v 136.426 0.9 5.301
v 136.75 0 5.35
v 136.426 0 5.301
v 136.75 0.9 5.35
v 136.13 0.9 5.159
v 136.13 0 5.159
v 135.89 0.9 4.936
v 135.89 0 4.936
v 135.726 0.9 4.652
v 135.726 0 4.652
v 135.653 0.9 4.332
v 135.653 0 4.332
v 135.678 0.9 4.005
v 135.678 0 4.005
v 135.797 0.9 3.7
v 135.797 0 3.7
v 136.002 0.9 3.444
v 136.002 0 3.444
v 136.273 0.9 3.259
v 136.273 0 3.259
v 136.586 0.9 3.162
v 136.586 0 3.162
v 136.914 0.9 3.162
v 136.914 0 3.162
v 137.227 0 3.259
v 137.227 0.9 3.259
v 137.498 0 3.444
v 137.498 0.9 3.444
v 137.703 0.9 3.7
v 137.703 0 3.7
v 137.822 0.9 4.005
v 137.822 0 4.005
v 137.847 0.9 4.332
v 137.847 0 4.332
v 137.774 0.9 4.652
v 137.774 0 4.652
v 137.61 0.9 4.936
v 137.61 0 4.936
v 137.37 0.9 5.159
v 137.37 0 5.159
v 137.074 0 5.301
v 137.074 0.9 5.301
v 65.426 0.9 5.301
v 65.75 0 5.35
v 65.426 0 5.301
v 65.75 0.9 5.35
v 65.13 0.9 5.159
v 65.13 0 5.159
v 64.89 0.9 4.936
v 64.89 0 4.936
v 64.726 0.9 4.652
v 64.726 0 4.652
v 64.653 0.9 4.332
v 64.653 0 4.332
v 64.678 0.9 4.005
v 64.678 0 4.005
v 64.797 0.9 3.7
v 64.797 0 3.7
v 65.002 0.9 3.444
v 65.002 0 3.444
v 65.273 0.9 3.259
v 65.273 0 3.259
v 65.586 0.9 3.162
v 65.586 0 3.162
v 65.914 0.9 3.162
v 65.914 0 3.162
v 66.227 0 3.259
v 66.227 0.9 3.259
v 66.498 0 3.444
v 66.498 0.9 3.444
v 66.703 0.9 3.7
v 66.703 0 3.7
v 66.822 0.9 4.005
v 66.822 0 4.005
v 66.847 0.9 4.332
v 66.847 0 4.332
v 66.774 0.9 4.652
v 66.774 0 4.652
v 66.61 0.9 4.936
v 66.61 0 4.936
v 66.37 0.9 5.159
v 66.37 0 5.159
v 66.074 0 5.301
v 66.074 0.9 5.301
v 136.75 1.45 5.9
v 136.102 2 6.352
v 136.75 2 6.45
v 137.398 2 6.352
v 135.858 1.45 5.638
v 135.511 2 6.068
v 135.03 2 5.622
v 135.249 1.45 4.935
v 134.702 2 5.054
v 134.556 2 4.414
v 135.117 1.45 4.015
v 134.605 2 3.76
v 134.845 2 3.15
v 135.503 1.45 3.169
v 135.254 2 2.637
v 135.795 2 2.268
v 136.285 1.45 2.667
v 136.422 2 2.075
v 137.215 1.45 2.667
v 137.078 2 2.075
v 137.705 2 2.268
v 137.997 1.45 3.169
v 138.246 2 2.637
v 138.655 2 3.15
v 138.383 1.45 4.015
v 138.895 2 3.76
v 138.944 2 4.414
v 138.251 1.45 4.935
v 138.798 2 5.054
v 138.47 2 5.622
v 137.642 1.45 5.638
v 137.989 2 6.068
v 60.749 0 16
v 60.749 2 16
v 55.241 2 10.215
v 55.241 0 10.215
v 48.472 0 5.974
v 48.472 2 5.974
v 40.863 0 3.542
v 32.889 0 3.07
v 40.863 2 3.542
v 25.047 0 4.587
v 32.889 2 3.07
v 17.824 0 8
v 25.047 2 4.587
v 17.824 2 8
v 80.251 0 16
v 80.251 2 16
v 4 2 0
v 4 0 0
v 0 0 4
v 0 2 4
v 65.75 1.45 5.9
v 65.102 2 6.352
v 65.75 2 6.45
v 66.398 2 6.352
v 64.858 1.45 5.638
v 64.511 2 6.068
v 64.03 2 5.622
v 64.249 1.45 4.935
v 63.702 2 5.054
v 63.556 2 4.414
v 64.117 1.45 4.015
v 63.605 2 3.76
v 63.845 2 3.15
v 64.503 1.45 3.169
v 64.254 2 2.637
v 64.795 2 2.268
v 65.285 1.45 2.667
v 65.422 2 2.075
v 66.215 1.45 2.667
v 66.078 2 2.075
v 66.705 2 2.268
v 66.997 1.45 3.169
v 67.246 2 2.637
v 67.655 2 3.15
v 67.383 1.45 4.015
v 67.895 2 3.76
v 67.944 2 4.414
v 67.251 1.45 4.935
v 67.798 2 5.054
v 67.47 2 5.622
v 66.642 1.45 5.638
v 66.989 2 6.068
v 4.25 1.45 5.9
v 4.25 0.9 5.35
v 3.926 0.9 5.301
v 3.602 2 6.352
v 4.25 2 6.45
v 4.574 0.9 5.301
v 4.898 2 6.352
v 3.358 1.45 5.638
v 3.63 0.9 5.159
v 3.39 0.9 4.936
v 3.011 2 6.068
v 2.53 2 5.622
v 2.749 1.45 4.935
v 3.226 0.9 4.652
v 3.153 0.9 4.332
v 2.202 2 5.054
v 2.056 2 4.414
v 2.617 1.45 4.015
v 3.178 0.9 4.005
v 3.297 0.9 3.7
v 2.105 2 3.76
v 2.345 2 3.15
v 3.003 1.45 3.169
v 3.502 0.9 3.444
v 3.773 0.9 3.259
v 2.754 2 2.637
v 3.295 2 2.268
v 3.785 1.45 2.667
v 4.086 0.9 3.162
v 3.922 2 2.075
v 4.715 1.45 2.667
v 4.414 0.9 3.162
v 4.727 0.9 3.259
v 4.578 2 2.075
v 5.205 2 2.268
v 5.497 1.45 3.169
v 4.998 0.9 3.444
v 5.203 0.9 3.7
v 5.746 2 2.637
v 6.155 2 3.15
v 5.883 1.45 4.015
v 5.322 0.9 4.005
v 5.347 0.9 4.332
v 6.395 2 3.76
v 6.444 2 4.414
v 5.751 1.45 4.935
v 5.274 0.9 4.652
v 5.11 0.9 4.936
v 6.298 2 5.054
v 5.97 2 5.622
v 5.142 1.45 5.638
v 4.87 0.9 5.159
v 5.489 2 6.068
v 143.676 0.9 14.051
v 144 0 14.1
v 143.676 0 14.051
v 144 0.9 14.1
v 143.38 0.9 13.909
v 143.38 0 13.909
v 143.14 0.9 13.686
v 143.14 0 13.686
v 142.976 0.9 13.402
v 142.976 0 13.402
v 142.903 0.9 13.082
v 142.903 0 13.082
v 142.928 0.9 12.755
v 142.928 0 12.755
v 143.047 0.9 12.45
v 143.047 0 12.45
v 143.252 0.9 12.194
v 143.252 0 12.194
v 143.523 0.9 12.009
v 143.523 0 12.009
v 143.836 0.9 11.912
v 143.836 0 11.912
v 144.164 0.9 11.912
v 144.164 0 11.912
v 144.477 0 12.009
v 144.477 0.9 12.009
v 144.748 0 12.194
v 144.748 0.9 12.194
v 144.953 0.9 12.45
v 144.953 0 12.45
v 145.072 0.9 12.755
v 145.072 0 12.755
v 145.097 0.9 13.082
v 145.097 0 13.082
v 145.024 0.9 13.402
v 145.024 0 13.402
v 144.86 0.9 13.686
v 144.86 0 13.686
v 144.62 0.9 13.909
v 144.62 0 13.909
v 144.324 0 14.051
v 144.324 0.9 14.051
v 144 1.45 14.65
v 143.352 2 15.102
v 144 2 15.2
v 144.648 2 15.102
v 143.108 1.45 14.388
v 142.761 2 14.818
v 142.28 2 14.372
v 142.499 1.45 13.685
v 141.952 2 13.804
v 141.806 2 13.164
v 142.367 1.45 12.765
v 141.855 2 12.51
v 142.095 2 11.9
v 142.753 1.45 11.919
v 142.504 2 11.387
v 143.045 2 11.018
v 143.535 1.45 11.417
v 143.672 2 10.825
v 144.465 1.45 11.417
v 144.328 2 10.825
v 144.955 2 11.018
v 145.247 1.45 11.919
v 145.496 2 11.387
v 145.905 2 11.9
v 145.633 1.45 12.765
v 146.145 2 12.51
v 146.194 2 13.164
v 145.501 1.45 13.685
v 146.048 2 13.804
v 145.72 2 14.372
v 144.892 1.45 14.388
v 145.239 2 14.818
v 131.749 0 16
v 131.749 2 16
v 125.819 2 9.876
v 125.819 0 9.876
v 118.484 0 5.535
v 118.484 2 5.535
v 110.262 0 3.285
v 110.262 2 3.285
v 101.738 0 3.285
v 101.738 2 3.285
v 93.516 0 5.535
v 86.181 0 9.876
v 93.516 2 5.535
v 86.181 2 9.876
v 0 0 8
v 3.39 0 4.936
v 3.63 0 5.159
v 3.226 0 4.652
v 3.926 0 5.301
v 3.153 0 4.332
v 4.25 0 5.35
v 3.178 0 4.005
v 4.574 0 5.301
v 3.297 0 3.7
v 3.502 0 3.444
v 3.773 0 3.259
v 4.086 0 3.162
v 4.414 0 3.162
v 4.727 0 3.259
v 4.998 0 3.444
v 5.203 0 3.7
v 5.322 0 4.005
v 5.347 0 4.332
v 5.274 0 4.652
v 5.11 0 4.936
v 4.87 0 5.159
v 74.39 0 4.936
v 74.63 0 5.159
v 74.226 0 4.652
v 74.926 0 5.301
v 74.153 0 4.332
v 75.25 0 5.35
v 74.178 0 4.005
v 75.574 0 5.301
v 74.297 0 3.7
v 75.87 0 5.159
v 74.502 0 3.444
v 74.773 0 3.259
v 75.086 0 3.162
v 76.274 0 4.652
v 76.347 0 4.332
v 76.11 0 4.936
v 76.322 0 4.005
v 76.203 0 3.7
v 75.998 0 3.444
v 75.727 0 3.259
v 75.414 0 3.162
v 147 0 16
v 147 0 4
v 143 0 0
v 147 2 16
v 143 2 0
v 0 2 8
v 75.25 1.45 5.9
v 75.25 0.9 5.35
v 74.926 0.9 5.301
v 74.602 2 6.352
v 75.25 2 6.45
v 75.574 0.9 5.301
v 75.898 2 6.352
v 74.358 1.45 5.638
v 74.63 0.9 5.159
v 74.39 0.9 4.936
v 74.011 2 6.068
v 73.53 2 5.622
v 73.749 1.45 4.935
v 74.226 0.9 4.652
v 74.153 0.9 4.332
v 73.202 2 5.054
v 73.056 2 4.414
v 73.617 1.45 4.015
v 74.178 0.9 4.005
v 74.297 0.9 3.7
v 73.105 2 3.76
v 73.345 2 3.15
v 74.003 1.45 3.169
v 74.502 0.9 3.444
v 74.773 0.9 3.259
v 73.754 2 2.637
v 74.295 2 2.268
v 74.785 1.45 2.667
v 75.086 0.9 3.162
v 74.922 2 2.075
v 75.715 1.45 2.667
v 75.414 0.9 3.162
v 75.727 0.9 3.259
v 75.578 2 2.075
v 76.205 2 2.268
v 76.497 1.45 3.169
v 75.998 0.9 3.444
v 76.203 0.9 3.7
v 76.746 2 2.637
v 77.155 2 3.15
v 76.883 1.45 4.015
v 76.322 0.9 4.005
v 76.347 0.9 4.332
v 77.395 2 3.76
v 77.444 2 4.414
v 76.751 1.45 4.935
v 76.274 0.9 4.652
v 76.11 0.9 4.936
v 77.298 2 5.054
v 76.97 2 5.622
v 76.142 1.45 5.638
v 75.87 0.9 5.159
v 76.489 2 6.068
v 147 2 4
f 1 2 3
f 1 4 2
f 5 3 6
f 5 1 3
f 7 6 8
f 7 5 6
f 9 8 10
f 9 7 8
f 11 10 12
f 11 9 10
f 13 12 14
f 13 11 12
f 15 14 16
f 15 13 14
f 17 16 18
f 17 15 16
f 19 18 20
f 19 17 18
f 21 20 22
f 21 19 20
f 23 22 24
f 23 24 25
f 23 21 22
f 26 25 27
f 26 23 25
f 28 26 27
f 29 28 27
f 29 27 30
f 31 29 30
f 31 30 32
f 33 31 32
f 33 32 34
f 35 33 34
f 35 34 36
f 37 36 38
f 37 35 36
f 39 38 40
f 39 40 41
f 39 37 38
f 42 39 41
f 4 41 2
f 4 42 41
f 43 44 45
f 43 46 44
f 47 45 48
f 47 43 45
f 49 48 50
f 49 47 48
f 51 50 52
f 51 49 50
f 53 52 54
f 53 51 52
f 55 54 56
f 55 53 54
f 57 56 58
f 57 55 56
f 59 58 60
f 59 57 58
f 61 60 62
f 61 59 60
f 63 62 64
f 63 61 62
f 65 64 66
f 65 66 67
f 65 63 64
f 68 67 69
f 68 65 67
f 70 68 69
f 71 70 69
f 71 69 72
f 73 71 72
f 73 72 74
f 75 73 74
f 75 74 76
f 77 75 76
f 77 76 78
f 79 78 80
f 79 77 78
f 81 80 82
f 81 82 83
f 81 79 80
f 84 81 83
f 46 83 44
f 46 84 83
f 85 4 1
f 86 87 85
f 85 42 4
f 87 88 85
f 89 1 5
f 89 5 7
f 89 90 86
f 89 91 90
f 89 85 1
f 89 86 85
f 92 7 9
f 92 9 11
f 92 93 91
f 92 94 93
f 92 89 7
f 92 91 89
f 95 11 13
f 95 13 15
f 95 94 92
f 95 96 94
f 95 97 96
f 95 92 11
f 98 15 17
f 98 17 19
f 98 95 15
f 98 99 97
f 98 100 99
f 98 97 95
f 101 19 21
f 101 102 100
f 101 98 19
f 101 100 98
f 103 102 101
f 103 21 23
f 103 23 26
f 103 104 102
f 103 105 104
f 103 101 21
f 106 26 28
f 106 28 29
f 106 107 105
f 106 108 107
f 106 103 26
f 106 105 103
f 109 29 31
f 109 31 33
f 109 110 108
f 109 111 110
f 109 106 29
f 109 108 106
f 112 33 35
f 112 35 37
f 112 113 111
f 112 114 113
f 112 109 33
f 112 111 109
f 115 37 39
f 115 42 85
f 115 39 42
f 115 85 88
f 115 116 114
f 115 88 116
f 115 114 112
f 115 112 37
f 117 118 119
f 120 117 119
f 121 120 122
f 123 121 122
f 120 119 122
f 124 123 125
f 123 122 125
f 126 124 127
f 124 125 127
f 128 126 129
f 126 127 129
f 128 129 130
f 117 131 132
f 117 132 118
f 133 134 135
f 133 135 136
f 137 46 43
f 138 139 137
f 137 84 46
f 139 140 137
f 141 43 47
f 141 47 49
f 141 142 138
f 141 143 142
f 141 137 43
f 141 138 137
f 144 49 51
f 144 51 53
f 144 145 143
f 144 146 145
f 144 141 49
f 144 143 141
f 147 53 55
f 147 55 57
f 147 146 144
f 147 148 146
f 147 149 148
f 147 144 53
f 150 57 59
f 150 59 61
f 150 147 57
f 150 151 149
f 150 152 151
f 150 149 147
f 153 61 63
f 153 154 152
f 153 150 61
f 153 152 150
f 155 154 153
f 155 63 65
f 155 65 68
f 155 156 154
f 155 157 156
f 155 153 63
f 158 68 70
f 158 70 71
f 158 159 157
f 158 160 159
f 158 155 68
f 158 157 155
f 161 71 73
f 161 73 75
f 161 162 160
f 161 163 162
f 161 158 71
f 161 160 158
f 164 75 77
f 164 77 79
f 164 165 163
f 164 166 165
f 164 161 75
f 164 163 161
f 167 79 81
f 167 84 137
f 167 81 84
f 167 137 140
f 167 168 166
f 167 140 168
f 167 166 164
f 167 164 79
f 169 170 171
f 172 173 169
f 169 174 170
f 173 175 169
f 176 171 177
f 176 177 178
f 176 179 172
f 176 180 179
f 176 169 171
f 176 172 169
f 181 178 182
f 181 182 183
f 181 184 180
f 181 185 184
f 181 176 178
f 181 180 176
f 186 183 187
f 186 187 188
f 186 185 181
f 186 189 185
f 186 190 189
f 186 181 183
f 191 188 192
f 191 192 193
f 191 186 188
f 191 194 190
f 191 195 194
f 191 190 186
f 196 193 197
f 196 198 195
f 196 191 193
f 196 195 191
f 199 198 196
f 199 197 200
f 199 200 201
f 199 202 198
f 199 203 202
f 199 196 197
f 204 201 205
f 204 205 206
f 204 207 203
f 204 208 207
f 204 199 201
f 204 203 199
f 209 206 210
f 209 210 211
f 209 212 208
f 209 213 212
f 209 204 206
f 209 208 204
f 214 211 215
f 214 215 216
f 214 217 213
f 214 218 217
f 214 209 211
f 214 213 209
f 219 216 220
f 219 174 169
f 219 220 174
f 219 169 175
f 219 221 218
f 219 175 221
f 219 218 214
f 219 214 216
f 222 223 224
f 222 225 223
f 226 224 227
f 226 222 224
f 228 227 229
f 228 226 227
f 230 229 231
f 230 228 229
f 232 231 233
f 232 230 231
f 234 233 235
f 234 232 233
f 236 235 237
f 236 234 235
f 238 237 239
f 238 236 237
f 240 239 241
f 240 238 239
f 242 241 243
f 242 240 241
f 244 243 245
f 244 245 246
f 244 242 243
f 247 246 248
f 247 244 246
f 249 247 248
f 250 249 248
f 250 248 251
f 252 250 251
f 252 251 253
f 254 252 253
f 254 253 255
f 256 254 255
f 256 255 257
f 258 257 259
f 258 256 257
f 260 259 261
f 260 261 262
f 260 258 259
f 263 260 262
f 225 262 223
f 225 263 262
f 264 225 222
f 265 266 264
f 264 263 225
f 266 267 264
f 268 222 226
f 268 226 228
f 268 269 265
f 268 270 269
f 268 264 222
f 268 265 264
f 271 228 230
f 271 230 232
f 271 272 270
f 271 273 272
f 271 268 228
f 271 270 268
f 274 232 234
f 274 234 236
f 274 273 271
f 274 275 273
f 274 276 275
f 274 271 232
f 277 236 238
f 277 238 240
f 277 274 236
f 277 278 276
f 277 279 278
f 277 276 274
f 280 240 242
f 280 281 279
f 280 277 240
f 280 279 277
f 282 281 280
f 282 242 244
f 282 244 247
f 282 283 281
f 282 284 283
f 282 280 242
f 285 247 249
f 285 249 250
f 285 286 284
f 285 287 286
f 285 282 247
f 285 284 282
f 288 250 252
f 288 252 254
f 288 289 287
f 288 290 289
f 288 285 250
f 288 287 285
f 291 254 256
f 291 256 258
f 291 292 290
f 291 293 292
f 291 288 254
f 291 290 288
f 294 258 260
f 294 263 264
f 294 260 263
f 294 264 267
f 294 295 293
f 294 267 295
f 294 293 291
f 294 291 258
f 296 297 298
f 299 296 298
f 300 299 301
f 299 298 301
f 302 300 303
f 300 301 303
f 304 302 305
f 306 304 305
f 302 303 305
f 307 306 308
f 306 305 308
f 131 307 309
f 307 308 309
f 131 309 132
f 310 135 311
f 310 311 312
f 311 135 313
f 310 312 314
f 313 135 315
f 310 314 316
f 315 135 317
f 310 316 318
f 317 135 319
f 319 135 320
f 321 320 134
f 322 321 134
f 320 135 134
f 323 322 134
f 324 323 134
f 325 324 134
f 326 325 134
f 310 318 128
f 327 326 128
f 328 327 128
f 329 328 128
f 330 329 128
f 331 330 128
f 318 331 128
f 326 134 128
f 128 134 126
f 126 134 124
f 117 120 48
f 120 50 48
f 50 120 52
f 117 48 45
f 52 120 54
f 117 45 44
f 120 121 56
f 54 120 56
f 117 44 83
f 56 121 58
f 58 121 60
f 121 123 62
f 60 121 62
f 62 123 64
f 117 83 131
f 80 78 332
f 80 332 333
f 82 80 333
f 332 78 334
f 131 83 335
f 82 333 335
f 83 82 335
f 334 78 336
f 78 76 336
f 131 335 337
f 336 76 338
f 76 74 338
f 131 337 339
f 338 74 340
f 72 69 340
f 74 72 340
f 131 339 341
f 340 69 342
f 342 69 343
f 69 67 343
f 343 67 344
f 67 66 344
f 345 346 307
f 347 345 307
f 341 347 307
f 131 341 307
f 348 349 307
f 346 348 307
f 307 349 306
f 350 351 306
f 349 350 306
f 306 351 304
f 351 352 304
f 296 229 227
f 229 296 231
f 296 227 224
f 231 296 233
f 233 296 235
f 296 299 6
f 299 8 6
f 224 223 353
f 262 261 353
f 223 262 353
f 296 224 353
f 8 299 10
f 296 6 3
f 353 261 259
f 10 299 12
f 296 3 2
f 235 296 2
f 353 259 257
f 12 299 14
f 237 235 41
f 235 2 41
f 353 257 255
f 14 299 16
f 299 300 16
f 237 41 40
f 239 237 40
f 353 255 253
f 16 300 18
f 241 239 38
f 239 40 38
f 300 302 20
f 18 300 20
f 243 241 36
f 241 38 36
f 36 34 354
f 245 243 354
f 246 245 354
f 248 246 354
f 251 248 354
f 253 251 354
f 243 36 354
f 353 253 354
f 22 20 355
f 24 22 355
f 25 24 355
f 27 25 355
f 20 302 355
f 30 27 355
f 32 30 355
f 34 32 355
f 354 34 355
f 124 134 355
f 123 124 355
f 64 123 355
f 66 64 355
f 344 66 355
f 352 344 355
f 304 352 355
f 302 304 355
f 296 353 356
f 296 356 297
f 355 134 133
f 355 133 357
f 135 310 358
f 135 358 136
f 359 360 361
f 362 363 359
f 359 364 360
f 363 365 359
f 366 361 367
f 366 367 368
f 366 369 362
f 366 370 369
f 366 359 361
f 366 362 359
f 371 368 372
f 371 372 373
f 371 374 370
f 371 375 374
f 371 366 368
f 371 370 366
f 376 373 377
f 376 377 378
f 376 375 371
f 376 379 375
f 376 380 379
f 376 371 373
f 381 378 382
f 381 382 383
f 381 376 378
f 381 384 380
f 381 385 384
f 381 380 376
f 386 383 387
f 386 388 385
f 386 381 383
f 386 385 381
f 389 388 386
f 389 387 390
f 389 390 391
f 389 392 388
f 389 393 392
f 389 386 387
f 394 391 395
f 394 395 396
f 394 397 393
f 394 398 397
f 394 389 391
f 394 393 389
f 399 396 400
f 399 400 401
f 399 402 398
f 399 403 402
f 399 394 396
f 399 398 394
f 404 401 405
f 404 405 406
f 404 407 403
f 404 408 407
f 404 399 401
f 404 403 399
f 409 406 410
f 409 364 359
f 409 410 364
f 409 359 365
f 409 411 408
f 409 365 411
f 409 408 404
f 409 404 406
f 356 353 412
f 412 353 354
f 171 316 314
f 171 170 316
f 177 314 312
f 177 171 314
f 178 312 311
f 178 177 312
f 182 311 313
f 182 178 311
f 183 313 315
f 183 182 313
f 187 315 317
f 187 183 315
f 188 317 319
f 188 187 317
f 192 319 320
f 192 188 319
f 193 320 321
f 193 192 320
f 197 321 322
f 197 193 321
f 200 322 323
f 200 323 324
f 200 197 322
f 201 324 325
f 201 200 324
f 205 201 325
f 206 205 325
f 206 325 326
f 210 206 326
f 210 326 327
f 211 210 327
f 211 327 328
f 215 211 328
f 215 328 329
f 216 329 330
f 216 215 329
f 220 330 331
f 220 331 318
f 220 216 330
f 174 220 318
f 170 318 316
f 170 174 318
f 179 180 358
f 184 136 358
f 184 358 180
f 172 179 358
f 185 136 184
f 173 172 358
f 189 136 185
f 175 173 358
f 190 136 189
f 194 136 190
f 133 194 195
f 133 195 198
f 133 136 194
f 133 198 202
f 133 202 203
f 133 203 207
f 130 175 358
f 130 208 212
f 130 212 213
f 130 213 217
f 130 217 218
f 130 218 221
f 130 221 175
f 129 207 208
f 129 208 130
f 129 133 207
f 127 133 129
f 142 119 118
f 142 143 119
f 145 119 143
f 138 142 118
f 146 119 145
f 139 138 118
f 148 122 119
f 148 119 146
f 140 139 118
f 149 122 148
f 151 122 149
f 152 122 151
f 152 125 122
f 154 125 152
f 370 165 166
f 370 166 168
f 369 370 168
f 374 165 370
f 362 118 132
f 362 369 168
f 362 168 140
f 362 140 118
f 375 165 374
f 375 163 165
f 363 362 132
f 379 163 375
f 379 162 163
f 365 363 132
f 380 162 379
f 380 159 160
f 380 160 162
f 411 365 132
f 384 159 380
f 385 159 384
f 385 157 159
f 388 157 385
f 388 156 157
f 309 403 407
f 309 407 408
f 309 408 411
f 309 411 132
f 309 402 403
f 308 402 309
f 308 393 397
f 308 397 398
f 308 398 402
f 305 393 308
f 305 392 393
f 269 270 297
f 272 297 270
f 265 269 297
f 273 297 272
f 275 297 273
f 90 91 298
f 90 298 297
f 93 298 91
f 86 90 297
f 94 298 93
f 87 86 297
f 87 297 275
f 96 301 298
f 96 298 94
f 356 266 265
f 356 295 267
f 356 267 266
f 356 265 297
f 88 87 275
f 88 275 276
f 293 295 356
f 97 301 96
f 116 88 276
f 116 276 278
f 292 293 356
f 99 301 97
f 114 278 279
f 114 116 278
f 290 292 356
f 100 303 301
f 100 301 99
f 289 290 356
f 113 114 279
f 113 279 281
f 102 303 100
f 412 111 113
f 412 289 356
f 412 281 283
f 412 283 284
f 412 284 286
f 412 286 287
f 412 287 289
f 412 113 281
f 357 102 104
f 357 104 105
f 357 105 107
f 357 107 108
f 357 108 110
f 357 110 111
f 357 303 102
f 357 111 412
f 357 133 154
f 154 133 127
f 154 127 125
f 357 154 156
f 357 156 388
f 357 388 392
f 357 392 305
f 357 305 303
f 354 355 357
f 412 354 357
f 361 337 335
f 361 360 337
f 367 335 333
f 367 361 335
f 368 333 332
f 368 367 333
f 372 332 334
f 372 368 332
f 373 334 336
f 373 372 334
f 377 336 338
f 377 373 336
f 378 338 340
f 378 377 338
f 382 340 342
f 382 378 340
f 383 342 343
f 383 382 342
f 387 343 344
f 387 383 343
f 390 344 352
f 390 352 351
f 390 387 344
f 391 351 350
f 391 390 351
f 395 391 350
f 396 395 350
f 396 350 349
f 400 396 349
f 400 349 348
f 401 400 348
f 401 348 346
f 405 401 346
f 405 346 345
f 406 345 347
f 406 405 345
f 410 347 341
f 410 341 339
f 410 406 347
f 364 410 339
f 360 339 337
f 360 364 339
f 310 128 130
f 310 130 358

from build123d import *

# Parameters (mm, degrees)
SKETCH_1_W               = 147
SKETCH_1_H               = 37
EXTRUDE_1_DEPTH          = 2
SKETCH_2_R               = 1
CUT_EXTRUDE_604_DEPTH    = 2
SKETCH_5_R               = 1
SKETCH_5_R_2             = 32
FANS_DEPTH               = 10
CHAMFER_1_SIZE           = 4
SKETCH_6_W               = 44.721110511
SKETCH_6_H               = 34.816534288
SKETCH_6_W_2             = 53.357784661
SKETCH_6_W_3             = 25.346191928
SKETCH_6_H_2             = 23.882814665
CUT_EXTRUDE_1_DEPTH      = 10
HOLE_WIZARD_1_AT_2_COUNT = 2
HOLE_WIZARD_1_AT_2_PITCH = 61.5
HOLE_WIZARD_1_AT_3_COUNT = 2
HOLE_WIZARD_1_AT_3_PITCH = 71
HOLE_WIZARD_1_AT_4_COUNT = 2
HOLE_WIZARD_1_AT_4_PITCH = 132.5
HOLE_WIZARD_1_AT_5_COUNT = 2
HOLE_WIZARD_1_AT_5_PITCH = 140.023658715


with BuildPart() as part:
    # 草图1 → 凸台-拉伸1 (new body)
    with BuildSketch(Plane(origin=(0, 0, 0), x_dir=(1, 0, 0), z_dir=(0, 1, 0))):
        with Locations((73.5, -18.5)):
            Rectangle(SKETCH_1_W, SKETCH_1_H)
    extrude(amount=EXTRUDE_1_DEPTH)

    # 草图2 → Cut-Extrude 604 (cut)
    with BuildSketch(Plane(origin=(0, 2, 0), x_dir=(1, 0, 0), z_dir=(0, 1, 0))):
        with Locations(Location((144, -13, 0), (0, 0, 270))):
            Circle(SKETCH_2_R)
    extrude(amount=-CUT_EXTRUDE_604_DEPTH, mode=Mode.SUBTRACT)

    # 草图5 → Fans (cut)
    with BuildSketch(Plane(origin=(0, 2, 0), x_dir=(1, 0, 0), z_dir=(0, 1, 0))):
        with Locations(Location((75.25, -4.25, 0), (0, 0, 270))):
            Circle(SKETCH_5_R)
        with Locations(Location((136.75, -4.25, 0), (0, 0, 270))):
            Circle(SKETCH_5_R)
        with Locations((106, -35)):
            Circle(SKETCH_5_R_2)
        with Locations(Location((4.25, -4.25, 0), (0, 0, 270))):
            Circle(SKETCH_5_R)
        with Locations(Location((65.75, -4.25, 0), (0, 0, 270))):
            Circle(SKETCH_5_R)
        with Locations((35, -35)):
            Circle(SKETCH_5_R_2)
    extrude(amount=-FANS_DEPTH, mode=Mode.SUBTRACT)

    # 倒角1
    chamfer_1_edges = [part.edges().sort_by_distance(p)[0] for p in [
        (0, 1, 0),
        (147, 1, 0),
    ]]
    chamfer(chamfer_1_edges, length=CHAMFER_1_SIZE)

    # 草图6 → 切除-拉伸1 (cut)
    with BuildSketch(Plane(origin=(0, 0, 0), x_dir=(-1, 0, 0), z_dir=(0, -1, 0))):
        with Locations((-9.242414788, -25.408267144)):
            Rectangle(SKETCH_6_W, SKETCH_6_H)
        with Locations((-130.712137278, -33.408267144)):
            Rectangle(SKETCH_6_W_2, SKETCH_6_H)
        with Locations((-72.793206756, -27.941407333)):
            Rectangle(SKETCH_6_W_3, SKETCH_6_H_2)
    extrude(amount=-CUT_EXTRUDE_1_DEPTH, mode=Mode.SUBTRACT)

    # 草图8 → 打孔尺寸(%根据)内六角花形沉头螺钉的类型1 (revolve, cut)
    with BuildSketch(Plane(origin=(4.25, 2, 4.25), x_dir=(0, 0, 1), z_dir=(1, 0, 0))):
        Polygon((0, 0), (0, 2), (1.1, 2), (1.1, 1.1), (2.2, 0), align=None)
    hole_wizard_1 = revolve(axis=Axis((4.25, 8.35, 4.25), (0, -1, 0)), mode=Mode.SUBTRACT)

    # 打孔尺寸(%根据)内六角花形沉头螺钉的类型1 at 2: 打孔尺寸(%根据)内六角花形沉头螺钉的类型1 ×2
    with Locations(*[(i * HOLE_WIZARD_1_AT_2_PITCH, 0, 0) for i in range(1, HOLE_WIZARD_1_AT_2_COUNT)]):
        add(hole_wizard_1, mode=Mode.SUBTRACT)

    # 打孔尺寸(%根据)内六角花形沉头螺钉的类型1 at 3: 打孔尺寸(%根据)内六角花形沉头螺钉的类型1 ×2
    with Locations(*[(i * HOLE_WIZARD_1_AT_3_PITCH, 0, 0) for i in range(1, HOLE_WIZARD_1_AT_3_COUNT)]):
        add(hole_wizard_1, mode=Mode.SUBTRACT)

    # 打孔尺寸(%根据)内六角花形沉头螺钉的类型1 at 4: 打孔尺寸(%根据)内六角花形沉头螺钉的类型1 ×2
    with Locations(*[(i * HOLE_WIZARD_1_AT_4_PITCH, 0, 0) for i in range(1, HOLE_WIZARD_1_AT_4_COUNT)]):
        add(hole_wizard_1, mode=Mode.SUBTRACT)

    # 打孔尺寸(%根据)内六角花形沉头螺钉的类型1 at 5: 打孔尺寸(%根据)内六角花形沉头螺钉的类型1 ×2
    with Locations(*[Vector(0.9980456251626064, 0, 0.062489439858123795) * (i * HOLE_WIZARD_1_AT_5_PITCH) for i in range(1, HOLE_WIZARD_1_AT_5_COUNT)]):
        add(hole_wizard_1, mode=Mode.SUBTRACT)


solid = part.part
